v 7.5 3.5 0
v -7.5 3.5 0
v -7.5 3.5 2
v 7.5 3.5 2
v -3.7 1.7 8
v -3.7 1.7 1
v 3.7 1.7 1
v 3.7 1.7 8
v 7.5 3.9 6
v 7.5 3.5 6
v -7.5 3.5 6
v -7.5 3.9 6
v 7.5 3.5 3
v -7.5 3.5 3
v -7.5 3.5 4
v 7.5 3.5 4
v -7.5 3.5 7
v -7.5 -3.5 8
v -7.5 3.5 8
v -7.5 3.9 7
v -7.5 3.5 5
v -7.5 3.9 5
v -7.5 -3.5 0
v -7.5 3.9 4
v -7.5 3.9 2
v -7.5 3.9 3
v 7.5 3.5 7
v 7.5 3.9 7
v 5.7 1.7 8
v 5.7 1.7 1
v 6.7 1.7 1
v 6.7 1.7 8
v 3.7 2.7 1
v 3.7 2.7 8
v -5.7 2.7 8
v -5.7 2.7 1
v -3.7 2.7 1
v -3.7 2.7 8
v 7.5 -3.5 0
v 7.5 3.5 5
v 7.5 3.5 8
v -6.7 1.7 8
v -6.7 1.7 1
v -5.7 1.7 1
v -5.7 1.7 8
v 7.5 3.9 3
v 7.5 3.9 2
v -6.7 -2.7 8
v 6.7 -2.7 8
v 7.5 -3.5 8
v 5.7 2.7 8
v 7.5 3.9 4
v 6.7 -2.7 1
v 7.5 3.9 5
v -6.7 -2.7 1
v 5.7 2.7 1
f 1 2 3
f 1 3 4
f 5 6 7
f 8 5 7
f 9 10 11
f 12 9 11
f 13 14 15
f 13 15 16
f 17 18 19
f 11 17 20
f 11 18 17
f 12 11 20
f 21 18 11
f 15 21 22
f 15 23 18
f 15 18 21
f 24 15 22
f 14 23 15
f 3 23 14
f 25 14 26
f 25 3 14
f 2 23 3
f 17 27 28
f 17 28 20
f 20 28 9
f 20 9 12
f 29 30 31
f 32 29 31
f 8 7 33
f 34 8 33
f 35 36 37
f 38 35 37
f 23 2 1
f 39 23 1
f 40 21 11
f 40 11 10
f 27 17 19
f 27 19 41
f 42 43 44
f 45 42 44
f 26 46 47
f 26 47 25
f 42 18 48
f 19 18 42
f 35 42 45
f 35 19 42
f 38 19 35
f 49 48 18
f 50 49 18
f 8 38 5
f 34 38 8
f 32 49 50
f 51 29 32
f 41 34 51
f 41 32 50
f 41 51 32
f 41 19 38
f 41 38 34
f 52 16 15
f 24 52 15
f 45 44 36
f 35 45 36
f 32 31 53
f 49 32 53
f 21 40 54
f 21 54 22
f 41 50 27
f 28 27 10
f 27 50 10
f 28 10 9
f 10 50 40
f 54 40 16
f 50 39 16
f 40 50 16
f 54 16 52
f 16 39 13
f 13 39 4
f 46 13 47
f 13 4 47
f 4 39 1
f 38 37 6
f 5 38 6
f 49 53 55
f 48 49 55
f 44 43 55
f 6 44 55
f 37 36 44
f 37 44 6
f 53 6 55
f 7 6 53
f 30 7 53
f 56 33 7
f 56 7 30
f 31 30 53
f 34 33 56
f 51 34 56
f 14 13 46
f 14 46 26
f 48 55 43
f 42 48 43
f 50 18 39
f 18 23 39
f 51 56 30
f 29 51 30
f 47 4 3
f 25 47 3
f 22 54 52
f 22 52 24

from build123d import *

# Parameters (mm, degrees)
F0_W     = 15
F0_H     = 7
F1_DEPTH = 1
F2_W     = 15
F2_H     = 7
F3_DEPTH = 7
F4_W     = 15
F4_H     = 1
F5_DEPTH = 0.4


with BuildPart() as f1:
    # F0 (on Top) → F1 (new body)
    with BuildSketch(Plane.XY):
        Rectangle(F0_W, F0_H)
    extrude(amount=F1_DEPTH)

    # F2 (on face) → F3 (join)
    with BuildSketch(Plane.XY.offset(1)):
        Rectangle(F2_W, F2_H)
        Polygon((-6.7, -2.7), (-6.7, 1.7), (-5.7, 1.7), (-5.7, 2.7), (-3.7, 2.7), (-3.7, 1.7), (3.7, 1.7), (3.7, 2.7), (5.7, 2.7), (5.7, 1.7), (6.7, 1.7), (6.7, -2.7), align=None, mode=Mode.SUBTRACT)
    extrude(amount=F3_DEPTH)

    # F4 (on face) → F5 (join)
    with BuildSketch(Plane(origin=(0, 3.5, 0), x_dir=(-1, 0, 0), z_dir=(0, 1, 0))):
        with Locations((0, 6.5)):
            Rectangle(F4_W, F4_H)
        with Locations((0, 4.5)):
            Rectangle(F4_W, F4_H)
        with Locations((0, 2.5)):
            Rectangle(F4_W, F4_H)
    extrude(amount=F5_DEPTH)


solid = f1.part
